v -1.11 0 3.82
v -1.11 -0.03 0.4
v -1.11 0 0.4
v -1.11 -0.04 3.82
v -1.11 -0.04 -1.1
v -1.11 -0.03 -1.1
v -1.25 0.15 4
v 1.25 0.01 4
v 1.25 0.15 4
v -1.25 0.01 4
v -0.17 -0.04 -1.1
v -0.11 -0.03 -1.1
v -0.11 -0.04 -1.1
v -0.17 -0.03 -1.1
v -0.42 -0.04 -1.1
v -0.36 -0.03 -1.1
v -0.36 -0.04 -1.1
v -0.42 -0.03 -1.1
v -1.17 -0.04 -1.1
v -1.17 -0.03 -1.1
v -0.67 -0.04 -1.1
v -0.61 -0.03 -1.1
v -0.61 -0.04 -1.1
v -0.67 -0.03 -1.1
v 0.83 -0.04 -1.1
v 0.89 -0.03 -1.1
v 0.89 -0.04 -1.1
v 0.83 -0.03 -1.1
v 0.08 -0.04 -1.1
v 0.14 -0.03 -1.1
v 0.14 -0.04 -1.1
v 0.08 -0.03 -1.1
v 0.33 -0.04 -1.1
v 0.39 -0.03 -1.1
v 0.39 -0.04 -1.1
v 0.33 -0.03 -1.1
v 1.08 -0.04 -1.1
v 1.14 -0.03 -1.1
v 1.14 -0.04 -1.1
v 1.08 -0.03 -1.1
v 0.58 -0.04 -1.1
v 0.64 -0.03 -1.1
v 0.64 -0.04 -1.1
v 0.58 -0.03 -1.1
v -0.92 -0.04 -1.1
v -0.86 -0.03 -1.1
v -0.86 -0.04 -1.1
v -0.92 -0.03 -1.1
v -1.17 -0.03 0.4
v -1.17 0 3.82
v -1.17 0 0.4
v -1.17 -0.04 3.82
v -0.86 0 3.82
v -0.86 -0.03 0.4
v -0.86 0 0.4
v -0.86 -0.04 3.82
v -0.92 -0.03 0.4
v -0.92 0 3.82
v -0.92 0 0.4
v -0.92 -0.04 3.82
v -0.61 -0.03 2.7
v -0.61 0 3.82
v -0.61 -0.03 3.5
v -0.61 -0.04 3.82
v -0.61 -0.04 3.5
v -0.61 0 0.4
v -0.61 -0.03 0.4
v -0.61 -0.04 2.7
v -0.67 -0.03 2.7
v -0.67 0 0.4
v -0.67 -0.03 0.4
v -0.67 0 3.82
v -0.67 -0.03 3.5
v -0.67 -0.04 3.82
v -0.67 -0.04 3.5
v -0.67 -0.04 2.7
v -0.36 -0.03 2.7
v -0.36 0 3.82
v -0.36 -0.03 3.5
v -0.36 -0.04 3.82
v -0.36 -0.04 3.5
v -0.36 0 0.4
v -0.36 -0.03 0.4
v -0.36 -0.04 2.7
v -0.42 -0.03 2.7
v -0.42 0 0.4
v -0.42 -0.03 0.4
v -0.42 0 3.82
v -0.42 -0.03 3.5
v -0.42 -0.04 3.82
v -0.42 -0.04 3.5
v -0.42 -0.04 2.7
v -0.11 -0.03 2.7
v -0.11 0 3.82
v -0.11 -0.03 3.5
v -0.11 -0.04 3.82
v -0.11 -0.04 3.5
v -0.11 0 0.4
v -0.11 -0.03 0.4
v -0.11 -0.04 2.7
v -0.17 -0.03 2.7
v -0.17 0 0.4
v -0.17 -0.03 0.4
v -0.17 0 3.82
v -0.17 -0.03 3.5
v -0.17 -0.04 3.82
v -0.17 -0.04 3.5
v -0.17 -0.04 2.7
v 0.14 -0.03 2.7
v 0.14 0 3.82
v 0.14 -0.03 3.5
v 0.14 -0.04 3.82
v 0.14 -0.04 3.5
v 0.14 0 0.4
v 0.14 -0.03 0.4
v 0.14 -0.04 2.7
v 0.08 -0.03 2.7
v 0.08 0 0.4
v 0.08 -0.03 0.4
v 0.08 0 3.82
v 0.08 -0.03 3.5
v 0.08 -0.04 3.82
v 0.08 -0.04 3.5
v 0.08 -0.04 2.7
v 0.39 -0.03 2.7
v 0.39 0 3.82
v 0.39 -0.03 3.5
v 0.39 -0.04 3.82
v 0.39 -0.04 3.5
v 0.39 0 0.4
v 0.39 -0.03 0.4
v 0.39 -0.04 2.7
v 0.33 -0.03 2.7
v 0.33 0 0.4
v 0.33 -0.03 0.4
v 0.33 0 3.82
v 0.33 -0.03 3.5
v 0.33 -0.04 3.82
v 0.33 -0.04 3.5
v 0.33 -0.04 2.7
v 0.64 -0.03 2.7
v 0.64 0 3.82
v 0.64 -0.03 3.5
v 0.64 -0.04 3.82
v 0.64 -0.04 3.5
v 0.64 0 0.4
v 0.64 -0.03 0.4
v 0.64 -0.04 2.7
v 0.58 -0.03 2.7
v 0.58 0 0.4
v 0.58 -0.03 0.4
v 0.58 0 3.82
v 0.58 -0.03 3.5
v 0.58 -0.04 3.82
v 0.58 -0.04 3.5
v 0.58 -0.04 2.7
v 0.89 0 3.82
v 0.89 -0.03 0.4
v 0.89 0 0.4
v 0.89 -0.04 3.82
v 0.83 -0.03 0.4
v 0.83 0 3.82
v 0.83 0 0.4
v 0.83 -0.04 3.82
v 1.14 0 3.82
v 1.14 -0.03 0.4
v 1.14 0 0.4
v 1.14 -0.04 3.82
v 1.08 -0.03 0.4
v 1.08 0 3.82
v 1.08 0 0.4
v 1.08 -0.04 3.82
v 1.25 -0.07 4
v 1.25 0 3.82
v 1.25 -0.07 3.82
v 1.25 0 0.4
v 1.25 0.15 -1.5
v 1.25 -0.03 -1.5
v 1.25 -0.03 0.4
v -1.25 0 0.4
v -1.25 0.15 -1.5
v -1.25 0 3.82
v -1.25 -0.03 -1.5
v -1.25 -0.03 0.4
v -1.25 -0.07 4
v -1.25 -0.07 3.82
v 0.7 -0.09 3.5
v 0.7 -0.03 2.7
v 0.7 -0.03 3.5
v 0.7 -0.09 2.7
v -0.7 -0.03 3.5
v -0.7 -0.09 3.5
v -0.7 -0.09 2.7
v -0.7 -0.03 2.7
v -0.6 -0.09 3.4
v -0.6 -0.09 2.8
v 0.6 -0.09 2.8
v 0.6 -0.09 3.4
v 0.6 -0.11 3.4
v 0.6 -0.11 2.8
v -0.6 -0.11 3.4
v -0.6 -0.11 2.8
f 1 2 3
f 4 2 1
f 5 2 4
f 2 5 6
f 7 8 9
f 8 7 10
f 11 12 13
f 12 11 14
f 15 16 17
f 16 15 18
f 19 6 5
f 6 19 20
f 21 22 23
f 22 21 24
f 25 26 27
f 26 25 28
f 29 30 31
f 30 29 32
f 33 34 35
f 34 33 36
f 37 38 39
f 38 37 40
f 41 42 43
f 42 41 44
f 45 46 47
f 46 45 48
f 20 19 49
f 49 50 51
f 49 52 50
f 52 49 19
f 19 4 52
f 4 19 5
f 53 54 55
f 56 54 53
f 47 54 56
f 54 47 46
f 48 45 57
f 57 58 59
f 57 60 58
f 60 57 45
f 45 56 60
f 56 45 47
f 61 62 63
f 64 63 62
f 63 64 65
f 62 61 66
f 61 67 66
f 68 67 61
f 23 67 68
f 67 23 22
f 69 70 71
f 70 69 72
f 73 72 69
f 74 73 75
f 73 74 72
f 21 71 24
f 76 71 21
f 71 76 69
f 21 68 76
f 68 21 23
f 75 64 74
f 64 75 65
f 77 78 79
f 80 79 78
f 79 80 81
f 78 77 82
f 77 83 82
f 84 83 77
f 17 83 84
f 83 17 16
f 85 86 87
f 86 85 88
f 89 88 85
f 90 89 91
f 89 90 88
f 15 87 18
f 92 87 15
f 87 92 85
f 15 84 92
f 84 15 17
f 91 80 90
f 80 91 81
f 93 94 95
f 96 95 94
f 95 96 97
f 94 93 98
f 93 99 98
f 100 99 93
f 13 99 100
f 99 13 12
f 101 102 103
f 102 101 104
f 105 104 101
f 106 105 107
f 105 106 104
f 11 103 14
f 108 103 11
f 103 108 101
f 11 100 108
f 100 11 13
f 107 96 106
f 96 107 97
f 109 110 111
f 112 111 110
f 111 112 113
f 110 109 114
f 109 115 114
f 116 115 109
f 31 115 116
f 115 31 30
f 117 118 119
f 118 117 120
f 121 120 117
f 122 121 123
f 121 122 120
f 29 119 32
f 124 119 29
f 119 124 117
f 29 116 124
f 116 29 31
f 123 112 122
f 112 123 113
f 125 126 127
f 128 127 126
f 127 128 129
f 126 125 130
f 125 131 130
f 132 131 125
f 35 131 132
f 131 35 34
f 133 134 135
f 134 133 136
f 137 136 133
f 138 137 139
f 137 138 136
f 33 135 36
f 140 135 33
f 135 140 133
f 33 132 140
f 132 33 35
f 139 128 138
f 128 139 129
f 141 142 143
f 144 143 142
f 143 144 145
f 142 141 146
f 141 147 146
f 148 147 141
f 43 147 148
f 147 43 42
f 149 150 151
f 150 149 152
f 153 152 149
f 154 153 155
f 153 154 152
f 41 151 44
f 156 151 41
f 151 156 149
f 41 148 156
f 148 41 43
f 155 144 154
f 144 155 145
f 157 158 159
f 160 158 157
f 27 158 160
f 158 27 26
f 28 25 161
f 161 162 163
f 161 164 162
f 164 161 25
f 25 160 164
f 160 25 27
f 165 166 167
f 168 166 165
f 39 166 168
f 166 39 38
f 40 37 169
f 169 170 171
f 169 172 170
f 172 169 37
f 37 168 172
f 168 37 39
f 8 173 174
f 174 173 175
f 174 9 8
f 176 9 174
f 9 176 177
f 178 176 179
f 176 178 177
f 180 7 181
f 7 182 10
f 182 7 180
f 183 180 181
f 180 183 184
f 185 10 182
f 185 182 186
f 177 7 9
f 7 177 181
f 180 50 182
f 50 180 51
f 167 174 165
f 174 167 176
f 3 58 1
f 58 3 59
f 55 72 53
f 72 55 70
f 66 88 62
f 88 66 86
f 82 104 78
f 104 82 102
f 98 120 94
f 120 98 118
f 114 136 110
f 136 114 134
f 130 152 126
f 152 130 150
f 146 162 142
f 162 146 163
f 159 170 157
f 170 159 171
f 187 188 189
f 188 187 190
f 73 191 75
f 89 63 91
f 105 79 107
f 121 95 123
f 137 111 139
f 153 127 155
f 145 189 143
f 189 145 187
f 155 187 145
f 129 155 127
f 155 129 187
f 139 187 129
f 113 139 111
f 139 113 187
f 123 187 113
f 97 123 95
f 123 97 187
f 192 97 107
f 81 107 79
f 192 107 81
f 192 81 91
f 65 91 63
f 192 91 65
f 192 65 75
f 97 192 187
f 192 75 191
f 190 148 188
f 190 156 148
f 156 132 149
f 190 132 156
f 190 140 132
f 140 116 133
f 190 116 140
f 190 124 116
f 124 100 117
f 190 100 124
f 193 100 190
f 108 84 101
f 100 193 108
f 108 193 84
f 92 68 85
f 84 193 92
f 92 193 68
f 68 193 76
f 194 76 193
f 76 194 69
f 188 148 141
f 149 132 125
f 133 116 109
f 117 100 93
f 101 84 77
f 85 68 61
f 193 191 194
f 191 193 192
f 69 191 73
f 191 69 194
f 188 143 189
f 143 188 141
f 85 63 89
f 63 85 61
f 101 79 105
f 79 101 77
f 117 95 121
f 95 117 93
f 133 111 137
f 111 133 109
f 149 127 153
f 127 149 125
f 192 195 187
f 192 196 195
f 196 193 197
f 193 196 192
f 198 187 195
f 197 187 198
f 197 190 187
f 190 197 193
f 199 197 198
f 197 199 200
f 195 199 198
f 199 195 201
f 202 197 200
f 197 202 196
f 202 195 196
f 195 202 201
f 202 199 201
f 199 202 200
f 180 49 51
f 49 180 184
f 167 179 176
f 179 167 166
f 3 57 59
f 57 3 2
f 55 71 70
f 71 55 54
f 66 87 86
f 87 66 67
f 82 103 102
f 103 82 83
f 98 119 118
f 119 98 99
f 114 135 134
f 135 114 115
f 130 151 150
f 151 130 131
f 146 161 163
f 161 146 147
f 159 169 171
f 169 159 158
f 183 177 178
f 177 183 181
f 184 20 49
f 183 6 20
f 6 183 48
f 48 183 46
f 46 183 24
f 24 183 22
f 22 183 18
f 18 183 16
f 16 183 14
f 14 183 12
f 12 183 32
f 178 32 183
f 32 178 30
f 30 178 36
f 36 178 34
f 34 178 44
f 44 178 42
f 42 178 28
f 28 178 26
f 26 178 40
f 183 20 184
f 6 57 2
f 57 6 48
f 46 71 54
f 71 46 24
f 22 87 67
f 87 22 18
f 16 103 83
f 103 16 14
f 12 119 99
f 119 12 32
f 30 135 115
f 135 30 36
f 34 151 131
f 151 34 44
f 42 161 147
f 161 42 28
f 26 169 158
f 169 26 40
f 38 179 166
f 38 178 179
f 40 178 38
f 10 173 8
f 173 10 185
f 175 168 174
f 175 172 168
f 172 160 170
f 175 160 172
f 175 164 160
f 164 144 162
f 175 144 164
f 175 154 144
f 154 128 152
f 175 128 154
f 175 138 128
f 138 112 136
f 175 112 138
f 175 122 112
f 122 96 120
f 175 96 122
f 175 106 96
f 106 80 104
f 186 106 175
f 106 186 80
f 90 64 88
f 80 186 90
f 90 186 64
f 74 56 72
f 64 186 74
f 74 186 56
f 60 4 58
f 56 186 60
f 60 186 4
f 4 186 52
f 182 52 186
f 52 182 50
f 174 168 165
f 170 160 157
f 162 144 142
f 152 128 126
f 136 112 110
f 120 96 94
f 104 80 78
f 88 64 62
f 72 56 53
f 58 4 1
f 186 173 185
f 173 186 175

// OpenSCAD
// Shed shell kit: wall window. See lib/lodge_kit.scad.
include <lib/lodge_kit.scad>
kind = "shed";
wall_window();
